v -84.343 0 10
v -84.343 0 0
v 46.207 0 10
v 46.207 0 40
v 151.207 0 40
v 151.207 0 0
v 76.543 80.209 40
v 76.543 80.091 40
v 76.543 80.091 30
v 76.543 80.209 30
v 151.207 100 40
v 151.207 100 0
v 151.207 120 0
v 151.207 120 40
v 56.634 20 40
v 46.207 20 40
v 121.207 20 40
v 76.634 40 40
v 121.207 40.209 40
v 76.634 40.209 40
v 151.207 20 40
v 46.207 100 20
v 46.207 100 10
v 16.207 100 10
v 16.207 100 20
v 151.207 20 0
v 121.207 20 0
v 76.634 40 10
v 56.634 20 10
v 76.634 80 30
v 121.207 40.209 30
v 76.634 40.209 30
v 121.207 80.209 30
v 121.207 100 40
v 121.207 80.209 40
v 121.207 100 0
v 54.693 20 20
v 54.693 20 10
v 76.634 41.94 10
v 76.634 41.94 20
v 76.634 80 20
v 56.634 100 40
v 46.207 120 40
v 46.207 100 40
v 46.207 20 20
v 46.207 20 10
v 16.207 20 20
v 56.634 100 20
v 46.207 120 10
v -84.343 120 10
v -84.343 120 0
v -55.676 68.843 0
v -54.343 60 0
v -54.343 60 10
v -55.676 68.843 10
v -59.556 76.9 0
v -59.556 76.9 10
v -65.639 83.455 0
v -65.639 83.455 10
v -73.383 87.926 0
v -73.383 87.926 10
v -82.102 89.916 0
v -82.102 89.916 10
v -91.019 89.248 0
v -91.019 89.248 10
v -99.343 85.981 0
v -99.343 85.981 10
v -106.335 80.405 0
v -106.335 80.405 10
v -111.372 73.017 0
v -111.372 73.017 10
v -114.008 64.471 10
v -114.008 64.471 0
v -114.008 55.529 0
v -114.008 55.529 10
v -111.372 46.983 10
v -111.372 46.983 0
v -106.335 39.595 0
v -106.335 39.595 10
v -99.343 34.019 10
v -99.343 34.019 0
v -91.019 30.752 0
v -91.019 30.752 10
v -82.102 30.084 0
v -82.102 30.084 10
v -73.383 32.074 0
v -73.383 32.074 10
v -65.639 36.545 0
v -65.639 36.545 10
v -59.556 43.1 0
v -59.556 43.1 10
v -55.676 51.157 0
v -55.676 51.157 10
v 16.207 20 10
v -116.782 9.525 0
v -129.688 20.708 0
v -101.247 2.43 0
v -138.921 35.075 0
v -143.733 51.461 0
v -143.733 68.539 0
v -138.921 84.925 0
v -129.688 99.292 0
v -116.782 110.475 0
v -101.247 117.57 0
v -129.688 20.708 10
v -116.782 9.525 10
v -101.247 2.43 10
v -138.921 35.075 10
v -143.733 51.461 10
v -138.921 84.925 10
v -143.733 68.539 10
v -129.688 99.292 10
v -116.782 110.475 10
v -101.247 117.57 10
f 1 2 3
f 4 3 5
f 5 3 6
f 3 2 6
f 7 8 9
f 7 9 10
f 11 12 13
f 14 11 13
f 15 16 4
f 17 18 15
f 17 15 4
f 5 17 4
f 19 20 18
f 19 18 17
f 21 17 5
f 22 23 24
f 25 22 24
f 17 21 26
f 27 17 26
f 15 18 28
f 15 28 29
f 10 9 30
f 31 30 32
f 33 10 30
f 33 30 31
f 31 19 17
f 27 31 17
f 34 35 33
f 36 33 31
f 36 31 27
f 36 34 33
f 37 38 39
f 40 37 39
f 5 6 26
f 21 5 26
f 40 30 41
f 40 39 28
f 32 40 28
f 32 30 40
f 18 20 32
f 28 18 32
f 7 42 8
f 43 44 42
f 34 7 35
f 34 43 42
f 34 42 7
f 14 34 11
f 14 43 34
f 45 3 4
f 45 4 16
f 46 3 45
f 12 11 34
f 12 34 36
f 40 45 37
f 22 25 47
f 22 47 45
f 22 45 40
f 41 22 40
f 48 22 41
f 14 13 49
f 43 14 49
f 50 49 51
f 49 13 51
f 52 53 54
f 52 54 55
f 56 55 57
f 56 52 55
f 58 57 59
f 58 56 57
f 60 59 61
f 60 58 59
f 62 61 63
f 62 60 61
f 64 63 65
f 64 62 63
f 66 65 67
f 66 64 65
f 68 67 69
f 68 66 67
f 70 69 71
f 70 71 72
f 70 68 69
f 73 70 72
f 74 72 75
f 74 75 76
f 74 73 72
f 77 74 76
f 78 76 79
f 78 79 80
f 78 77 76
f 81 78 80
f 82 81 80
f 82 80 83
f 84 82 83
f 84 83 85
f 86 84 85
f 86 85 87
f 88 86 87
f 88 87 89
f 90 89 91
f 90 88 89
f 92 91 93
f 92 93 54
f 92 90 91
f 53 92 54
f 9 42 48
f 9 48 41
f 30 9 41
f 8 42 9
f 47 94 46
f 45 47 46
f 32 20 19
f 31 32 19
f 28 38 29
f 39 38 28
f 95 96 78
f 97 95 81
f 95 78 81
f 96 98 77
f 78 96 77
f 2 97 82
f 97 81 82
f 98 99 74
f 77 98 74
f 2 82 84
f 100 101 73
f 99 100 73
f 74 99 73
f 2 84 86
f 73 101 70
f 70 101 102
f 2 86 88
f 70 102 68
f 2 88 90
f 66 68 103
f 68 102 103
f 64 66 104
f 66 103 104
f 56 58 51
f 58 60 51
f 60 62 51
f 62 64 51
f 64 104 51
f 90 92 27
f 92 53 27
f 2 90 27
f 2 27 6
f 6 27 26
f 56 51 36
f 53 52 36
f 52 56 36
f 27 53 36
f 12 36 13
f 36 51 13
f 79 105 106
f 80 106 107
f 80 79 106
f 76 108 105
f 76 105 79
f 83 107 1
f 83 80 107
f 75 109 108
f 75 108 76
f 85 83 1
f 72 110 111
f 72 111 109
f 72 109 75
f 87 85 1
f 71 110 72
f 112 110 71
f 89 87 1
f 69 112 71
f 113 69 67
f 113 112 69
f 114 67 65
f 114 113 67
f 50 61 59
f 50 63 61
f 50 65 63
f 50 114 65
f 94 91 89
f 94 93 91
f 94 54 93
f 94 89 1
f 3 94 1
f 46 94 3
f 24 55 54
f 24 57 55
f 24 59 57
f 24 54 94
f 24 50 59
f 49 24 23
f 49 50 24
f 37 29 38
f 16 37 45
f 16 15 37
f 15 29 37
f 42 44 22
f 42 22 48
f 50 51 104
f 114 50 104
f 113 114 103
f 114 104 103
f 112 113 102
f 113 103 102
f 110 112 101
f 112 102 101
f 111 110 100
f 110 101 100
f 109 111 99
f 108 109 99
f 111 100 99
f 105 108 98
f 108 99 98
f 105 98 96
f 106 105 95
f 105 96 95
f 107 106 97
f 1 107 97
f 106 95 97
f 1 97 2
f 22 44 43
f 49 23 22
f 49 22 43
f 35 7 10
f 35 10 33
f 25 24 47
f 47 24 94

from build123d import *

# Parameters (mm, degrees)
SKETCH2_R           = 30
BOSS_EXTRUDE2_DEPTH = 10
SKETCH4_W           = 39.74410588
SKETCH4_H           = 80
CUT_EXTRUDE1_DEPTH  = 30
SKETCH5_W           = 105
SKETCH5_H           = 120
BOSS_EXTRUDE3_DEPTH = 40
SKETCH6_W           = 78.106224714
SKETCH6_H           = 80
CUT_EXTRUDE2_DEPTH  = 30
SKETCH7_W           = 45
SKETCH7_H           = 40
CUT_EXTRUDE3_DEPTH  = 10
CUT_EXTRUDE4_DEPTH  = 30
BOSS_EXTRUDE4_DEPTH = 10


with BuildPart() as part:
    # Sketch2 → Boss-Extrude2 (new body)
    with BuildSketch(Plane.XY):
        with BuildLine():
            Line((46.207044142, 120), (-84.343419201, 120))
            ThreePointArc((-84.343419201, 120), (-144.343419201, 60), (-84.343419201, 0))
            Line((-84.343419201, 0), (0, 0))
            Line((0, 0), (151.207044142, 0))
            Line((151.207044142, 0), (151.207044142, 120))
            Line((151.207044142, 120), (46.207044142, 120))
        make_face()
        with Locations((-84.343419201, 60)):
            Circle(SKETCH2_R, mode=Mode.SUBTRACT)
    extrude(amount=BOSS_EXTRUDE2_DEPTH)

    # Sketch4 → Cut-Extrude1 (cut)
    with BuildSketch(Plane(origin=(151.207044142, 0, 0), x_dir=(0, 0, -1), z_dir=(1, 0, 0))):
        with Locations((-1.423296347, 60)):
            Rectangle(SKETCH4_W, SKETCH4_H)
    extrude(amount=-CUT_EXTRUDE1_DEPTH, mode=Mode.SUBTRACT)

    # Sketch5 → Boss-Extrude3 (add)
    with BuildSketch(Plane.XY):
        with Locations((98.707044142, 60)):
            Rectangle(SKETCH5_W, SKETCH5_H)
    extrude(amount=BOSS_EXTRUDE3_DEPTH)

    # Sketch6 → Cut-Extrude2 (cut)
    with BuildSketch(Plane(origin=(151.207044142, 0, 0), x_dir=(0, 0, -1), z_dir=(1, 0, 0))):
        with Locations((-16.932746975, 60)):
            Rectangle(SKETCH6_W, SKETCH6_H)
    extrude(amount=-CUT_EXTRUDE2_DEPTH, mode=Mode.SUBTRACT)

    # Sketch7 → Cut-Extrude3 (cut)
    with BuildSketch(Plane.XY.offset(40)):
        with Locations((99.042729198, 60.209092216)):
            Rectangle(SKETCH7_W, SKETCH7_H)
    extrude(amount=-CUT_EXTRUDE3_DEPTH, mode=Mode.SUBTRACT)

    # Sketch8 → Cut-Extrude4 (cut)
    with BuildSketch(Plane.XY.offset(40)):
        Polygon((19.599086243, 100), (56.633635385, 100), (76.633635385, 80), (76.633635385, 40), (56.633635385, 20), (19.599086243, 20), align=None)
    extrude(amount=-CUT_EXTRUDE4_DEPTH, mode=Mode.SUBTRACT)

    # Sketch9 → Boss-Extrude4 (add)
    with BuildSketch(Plane.XY.offset(10)):
        Polygon((46.207044142, 100), (16.207044142, 100), (16.207044142, 20), (46.207044142, 20), (54.69343027, 20), (76.633635385, 41.940205115), (76.633635385, 80), (56.633635385, 100), align=None)
    extrude(amount=BOSS_EXTRUDE4_DEPTH)


solid = part.part
